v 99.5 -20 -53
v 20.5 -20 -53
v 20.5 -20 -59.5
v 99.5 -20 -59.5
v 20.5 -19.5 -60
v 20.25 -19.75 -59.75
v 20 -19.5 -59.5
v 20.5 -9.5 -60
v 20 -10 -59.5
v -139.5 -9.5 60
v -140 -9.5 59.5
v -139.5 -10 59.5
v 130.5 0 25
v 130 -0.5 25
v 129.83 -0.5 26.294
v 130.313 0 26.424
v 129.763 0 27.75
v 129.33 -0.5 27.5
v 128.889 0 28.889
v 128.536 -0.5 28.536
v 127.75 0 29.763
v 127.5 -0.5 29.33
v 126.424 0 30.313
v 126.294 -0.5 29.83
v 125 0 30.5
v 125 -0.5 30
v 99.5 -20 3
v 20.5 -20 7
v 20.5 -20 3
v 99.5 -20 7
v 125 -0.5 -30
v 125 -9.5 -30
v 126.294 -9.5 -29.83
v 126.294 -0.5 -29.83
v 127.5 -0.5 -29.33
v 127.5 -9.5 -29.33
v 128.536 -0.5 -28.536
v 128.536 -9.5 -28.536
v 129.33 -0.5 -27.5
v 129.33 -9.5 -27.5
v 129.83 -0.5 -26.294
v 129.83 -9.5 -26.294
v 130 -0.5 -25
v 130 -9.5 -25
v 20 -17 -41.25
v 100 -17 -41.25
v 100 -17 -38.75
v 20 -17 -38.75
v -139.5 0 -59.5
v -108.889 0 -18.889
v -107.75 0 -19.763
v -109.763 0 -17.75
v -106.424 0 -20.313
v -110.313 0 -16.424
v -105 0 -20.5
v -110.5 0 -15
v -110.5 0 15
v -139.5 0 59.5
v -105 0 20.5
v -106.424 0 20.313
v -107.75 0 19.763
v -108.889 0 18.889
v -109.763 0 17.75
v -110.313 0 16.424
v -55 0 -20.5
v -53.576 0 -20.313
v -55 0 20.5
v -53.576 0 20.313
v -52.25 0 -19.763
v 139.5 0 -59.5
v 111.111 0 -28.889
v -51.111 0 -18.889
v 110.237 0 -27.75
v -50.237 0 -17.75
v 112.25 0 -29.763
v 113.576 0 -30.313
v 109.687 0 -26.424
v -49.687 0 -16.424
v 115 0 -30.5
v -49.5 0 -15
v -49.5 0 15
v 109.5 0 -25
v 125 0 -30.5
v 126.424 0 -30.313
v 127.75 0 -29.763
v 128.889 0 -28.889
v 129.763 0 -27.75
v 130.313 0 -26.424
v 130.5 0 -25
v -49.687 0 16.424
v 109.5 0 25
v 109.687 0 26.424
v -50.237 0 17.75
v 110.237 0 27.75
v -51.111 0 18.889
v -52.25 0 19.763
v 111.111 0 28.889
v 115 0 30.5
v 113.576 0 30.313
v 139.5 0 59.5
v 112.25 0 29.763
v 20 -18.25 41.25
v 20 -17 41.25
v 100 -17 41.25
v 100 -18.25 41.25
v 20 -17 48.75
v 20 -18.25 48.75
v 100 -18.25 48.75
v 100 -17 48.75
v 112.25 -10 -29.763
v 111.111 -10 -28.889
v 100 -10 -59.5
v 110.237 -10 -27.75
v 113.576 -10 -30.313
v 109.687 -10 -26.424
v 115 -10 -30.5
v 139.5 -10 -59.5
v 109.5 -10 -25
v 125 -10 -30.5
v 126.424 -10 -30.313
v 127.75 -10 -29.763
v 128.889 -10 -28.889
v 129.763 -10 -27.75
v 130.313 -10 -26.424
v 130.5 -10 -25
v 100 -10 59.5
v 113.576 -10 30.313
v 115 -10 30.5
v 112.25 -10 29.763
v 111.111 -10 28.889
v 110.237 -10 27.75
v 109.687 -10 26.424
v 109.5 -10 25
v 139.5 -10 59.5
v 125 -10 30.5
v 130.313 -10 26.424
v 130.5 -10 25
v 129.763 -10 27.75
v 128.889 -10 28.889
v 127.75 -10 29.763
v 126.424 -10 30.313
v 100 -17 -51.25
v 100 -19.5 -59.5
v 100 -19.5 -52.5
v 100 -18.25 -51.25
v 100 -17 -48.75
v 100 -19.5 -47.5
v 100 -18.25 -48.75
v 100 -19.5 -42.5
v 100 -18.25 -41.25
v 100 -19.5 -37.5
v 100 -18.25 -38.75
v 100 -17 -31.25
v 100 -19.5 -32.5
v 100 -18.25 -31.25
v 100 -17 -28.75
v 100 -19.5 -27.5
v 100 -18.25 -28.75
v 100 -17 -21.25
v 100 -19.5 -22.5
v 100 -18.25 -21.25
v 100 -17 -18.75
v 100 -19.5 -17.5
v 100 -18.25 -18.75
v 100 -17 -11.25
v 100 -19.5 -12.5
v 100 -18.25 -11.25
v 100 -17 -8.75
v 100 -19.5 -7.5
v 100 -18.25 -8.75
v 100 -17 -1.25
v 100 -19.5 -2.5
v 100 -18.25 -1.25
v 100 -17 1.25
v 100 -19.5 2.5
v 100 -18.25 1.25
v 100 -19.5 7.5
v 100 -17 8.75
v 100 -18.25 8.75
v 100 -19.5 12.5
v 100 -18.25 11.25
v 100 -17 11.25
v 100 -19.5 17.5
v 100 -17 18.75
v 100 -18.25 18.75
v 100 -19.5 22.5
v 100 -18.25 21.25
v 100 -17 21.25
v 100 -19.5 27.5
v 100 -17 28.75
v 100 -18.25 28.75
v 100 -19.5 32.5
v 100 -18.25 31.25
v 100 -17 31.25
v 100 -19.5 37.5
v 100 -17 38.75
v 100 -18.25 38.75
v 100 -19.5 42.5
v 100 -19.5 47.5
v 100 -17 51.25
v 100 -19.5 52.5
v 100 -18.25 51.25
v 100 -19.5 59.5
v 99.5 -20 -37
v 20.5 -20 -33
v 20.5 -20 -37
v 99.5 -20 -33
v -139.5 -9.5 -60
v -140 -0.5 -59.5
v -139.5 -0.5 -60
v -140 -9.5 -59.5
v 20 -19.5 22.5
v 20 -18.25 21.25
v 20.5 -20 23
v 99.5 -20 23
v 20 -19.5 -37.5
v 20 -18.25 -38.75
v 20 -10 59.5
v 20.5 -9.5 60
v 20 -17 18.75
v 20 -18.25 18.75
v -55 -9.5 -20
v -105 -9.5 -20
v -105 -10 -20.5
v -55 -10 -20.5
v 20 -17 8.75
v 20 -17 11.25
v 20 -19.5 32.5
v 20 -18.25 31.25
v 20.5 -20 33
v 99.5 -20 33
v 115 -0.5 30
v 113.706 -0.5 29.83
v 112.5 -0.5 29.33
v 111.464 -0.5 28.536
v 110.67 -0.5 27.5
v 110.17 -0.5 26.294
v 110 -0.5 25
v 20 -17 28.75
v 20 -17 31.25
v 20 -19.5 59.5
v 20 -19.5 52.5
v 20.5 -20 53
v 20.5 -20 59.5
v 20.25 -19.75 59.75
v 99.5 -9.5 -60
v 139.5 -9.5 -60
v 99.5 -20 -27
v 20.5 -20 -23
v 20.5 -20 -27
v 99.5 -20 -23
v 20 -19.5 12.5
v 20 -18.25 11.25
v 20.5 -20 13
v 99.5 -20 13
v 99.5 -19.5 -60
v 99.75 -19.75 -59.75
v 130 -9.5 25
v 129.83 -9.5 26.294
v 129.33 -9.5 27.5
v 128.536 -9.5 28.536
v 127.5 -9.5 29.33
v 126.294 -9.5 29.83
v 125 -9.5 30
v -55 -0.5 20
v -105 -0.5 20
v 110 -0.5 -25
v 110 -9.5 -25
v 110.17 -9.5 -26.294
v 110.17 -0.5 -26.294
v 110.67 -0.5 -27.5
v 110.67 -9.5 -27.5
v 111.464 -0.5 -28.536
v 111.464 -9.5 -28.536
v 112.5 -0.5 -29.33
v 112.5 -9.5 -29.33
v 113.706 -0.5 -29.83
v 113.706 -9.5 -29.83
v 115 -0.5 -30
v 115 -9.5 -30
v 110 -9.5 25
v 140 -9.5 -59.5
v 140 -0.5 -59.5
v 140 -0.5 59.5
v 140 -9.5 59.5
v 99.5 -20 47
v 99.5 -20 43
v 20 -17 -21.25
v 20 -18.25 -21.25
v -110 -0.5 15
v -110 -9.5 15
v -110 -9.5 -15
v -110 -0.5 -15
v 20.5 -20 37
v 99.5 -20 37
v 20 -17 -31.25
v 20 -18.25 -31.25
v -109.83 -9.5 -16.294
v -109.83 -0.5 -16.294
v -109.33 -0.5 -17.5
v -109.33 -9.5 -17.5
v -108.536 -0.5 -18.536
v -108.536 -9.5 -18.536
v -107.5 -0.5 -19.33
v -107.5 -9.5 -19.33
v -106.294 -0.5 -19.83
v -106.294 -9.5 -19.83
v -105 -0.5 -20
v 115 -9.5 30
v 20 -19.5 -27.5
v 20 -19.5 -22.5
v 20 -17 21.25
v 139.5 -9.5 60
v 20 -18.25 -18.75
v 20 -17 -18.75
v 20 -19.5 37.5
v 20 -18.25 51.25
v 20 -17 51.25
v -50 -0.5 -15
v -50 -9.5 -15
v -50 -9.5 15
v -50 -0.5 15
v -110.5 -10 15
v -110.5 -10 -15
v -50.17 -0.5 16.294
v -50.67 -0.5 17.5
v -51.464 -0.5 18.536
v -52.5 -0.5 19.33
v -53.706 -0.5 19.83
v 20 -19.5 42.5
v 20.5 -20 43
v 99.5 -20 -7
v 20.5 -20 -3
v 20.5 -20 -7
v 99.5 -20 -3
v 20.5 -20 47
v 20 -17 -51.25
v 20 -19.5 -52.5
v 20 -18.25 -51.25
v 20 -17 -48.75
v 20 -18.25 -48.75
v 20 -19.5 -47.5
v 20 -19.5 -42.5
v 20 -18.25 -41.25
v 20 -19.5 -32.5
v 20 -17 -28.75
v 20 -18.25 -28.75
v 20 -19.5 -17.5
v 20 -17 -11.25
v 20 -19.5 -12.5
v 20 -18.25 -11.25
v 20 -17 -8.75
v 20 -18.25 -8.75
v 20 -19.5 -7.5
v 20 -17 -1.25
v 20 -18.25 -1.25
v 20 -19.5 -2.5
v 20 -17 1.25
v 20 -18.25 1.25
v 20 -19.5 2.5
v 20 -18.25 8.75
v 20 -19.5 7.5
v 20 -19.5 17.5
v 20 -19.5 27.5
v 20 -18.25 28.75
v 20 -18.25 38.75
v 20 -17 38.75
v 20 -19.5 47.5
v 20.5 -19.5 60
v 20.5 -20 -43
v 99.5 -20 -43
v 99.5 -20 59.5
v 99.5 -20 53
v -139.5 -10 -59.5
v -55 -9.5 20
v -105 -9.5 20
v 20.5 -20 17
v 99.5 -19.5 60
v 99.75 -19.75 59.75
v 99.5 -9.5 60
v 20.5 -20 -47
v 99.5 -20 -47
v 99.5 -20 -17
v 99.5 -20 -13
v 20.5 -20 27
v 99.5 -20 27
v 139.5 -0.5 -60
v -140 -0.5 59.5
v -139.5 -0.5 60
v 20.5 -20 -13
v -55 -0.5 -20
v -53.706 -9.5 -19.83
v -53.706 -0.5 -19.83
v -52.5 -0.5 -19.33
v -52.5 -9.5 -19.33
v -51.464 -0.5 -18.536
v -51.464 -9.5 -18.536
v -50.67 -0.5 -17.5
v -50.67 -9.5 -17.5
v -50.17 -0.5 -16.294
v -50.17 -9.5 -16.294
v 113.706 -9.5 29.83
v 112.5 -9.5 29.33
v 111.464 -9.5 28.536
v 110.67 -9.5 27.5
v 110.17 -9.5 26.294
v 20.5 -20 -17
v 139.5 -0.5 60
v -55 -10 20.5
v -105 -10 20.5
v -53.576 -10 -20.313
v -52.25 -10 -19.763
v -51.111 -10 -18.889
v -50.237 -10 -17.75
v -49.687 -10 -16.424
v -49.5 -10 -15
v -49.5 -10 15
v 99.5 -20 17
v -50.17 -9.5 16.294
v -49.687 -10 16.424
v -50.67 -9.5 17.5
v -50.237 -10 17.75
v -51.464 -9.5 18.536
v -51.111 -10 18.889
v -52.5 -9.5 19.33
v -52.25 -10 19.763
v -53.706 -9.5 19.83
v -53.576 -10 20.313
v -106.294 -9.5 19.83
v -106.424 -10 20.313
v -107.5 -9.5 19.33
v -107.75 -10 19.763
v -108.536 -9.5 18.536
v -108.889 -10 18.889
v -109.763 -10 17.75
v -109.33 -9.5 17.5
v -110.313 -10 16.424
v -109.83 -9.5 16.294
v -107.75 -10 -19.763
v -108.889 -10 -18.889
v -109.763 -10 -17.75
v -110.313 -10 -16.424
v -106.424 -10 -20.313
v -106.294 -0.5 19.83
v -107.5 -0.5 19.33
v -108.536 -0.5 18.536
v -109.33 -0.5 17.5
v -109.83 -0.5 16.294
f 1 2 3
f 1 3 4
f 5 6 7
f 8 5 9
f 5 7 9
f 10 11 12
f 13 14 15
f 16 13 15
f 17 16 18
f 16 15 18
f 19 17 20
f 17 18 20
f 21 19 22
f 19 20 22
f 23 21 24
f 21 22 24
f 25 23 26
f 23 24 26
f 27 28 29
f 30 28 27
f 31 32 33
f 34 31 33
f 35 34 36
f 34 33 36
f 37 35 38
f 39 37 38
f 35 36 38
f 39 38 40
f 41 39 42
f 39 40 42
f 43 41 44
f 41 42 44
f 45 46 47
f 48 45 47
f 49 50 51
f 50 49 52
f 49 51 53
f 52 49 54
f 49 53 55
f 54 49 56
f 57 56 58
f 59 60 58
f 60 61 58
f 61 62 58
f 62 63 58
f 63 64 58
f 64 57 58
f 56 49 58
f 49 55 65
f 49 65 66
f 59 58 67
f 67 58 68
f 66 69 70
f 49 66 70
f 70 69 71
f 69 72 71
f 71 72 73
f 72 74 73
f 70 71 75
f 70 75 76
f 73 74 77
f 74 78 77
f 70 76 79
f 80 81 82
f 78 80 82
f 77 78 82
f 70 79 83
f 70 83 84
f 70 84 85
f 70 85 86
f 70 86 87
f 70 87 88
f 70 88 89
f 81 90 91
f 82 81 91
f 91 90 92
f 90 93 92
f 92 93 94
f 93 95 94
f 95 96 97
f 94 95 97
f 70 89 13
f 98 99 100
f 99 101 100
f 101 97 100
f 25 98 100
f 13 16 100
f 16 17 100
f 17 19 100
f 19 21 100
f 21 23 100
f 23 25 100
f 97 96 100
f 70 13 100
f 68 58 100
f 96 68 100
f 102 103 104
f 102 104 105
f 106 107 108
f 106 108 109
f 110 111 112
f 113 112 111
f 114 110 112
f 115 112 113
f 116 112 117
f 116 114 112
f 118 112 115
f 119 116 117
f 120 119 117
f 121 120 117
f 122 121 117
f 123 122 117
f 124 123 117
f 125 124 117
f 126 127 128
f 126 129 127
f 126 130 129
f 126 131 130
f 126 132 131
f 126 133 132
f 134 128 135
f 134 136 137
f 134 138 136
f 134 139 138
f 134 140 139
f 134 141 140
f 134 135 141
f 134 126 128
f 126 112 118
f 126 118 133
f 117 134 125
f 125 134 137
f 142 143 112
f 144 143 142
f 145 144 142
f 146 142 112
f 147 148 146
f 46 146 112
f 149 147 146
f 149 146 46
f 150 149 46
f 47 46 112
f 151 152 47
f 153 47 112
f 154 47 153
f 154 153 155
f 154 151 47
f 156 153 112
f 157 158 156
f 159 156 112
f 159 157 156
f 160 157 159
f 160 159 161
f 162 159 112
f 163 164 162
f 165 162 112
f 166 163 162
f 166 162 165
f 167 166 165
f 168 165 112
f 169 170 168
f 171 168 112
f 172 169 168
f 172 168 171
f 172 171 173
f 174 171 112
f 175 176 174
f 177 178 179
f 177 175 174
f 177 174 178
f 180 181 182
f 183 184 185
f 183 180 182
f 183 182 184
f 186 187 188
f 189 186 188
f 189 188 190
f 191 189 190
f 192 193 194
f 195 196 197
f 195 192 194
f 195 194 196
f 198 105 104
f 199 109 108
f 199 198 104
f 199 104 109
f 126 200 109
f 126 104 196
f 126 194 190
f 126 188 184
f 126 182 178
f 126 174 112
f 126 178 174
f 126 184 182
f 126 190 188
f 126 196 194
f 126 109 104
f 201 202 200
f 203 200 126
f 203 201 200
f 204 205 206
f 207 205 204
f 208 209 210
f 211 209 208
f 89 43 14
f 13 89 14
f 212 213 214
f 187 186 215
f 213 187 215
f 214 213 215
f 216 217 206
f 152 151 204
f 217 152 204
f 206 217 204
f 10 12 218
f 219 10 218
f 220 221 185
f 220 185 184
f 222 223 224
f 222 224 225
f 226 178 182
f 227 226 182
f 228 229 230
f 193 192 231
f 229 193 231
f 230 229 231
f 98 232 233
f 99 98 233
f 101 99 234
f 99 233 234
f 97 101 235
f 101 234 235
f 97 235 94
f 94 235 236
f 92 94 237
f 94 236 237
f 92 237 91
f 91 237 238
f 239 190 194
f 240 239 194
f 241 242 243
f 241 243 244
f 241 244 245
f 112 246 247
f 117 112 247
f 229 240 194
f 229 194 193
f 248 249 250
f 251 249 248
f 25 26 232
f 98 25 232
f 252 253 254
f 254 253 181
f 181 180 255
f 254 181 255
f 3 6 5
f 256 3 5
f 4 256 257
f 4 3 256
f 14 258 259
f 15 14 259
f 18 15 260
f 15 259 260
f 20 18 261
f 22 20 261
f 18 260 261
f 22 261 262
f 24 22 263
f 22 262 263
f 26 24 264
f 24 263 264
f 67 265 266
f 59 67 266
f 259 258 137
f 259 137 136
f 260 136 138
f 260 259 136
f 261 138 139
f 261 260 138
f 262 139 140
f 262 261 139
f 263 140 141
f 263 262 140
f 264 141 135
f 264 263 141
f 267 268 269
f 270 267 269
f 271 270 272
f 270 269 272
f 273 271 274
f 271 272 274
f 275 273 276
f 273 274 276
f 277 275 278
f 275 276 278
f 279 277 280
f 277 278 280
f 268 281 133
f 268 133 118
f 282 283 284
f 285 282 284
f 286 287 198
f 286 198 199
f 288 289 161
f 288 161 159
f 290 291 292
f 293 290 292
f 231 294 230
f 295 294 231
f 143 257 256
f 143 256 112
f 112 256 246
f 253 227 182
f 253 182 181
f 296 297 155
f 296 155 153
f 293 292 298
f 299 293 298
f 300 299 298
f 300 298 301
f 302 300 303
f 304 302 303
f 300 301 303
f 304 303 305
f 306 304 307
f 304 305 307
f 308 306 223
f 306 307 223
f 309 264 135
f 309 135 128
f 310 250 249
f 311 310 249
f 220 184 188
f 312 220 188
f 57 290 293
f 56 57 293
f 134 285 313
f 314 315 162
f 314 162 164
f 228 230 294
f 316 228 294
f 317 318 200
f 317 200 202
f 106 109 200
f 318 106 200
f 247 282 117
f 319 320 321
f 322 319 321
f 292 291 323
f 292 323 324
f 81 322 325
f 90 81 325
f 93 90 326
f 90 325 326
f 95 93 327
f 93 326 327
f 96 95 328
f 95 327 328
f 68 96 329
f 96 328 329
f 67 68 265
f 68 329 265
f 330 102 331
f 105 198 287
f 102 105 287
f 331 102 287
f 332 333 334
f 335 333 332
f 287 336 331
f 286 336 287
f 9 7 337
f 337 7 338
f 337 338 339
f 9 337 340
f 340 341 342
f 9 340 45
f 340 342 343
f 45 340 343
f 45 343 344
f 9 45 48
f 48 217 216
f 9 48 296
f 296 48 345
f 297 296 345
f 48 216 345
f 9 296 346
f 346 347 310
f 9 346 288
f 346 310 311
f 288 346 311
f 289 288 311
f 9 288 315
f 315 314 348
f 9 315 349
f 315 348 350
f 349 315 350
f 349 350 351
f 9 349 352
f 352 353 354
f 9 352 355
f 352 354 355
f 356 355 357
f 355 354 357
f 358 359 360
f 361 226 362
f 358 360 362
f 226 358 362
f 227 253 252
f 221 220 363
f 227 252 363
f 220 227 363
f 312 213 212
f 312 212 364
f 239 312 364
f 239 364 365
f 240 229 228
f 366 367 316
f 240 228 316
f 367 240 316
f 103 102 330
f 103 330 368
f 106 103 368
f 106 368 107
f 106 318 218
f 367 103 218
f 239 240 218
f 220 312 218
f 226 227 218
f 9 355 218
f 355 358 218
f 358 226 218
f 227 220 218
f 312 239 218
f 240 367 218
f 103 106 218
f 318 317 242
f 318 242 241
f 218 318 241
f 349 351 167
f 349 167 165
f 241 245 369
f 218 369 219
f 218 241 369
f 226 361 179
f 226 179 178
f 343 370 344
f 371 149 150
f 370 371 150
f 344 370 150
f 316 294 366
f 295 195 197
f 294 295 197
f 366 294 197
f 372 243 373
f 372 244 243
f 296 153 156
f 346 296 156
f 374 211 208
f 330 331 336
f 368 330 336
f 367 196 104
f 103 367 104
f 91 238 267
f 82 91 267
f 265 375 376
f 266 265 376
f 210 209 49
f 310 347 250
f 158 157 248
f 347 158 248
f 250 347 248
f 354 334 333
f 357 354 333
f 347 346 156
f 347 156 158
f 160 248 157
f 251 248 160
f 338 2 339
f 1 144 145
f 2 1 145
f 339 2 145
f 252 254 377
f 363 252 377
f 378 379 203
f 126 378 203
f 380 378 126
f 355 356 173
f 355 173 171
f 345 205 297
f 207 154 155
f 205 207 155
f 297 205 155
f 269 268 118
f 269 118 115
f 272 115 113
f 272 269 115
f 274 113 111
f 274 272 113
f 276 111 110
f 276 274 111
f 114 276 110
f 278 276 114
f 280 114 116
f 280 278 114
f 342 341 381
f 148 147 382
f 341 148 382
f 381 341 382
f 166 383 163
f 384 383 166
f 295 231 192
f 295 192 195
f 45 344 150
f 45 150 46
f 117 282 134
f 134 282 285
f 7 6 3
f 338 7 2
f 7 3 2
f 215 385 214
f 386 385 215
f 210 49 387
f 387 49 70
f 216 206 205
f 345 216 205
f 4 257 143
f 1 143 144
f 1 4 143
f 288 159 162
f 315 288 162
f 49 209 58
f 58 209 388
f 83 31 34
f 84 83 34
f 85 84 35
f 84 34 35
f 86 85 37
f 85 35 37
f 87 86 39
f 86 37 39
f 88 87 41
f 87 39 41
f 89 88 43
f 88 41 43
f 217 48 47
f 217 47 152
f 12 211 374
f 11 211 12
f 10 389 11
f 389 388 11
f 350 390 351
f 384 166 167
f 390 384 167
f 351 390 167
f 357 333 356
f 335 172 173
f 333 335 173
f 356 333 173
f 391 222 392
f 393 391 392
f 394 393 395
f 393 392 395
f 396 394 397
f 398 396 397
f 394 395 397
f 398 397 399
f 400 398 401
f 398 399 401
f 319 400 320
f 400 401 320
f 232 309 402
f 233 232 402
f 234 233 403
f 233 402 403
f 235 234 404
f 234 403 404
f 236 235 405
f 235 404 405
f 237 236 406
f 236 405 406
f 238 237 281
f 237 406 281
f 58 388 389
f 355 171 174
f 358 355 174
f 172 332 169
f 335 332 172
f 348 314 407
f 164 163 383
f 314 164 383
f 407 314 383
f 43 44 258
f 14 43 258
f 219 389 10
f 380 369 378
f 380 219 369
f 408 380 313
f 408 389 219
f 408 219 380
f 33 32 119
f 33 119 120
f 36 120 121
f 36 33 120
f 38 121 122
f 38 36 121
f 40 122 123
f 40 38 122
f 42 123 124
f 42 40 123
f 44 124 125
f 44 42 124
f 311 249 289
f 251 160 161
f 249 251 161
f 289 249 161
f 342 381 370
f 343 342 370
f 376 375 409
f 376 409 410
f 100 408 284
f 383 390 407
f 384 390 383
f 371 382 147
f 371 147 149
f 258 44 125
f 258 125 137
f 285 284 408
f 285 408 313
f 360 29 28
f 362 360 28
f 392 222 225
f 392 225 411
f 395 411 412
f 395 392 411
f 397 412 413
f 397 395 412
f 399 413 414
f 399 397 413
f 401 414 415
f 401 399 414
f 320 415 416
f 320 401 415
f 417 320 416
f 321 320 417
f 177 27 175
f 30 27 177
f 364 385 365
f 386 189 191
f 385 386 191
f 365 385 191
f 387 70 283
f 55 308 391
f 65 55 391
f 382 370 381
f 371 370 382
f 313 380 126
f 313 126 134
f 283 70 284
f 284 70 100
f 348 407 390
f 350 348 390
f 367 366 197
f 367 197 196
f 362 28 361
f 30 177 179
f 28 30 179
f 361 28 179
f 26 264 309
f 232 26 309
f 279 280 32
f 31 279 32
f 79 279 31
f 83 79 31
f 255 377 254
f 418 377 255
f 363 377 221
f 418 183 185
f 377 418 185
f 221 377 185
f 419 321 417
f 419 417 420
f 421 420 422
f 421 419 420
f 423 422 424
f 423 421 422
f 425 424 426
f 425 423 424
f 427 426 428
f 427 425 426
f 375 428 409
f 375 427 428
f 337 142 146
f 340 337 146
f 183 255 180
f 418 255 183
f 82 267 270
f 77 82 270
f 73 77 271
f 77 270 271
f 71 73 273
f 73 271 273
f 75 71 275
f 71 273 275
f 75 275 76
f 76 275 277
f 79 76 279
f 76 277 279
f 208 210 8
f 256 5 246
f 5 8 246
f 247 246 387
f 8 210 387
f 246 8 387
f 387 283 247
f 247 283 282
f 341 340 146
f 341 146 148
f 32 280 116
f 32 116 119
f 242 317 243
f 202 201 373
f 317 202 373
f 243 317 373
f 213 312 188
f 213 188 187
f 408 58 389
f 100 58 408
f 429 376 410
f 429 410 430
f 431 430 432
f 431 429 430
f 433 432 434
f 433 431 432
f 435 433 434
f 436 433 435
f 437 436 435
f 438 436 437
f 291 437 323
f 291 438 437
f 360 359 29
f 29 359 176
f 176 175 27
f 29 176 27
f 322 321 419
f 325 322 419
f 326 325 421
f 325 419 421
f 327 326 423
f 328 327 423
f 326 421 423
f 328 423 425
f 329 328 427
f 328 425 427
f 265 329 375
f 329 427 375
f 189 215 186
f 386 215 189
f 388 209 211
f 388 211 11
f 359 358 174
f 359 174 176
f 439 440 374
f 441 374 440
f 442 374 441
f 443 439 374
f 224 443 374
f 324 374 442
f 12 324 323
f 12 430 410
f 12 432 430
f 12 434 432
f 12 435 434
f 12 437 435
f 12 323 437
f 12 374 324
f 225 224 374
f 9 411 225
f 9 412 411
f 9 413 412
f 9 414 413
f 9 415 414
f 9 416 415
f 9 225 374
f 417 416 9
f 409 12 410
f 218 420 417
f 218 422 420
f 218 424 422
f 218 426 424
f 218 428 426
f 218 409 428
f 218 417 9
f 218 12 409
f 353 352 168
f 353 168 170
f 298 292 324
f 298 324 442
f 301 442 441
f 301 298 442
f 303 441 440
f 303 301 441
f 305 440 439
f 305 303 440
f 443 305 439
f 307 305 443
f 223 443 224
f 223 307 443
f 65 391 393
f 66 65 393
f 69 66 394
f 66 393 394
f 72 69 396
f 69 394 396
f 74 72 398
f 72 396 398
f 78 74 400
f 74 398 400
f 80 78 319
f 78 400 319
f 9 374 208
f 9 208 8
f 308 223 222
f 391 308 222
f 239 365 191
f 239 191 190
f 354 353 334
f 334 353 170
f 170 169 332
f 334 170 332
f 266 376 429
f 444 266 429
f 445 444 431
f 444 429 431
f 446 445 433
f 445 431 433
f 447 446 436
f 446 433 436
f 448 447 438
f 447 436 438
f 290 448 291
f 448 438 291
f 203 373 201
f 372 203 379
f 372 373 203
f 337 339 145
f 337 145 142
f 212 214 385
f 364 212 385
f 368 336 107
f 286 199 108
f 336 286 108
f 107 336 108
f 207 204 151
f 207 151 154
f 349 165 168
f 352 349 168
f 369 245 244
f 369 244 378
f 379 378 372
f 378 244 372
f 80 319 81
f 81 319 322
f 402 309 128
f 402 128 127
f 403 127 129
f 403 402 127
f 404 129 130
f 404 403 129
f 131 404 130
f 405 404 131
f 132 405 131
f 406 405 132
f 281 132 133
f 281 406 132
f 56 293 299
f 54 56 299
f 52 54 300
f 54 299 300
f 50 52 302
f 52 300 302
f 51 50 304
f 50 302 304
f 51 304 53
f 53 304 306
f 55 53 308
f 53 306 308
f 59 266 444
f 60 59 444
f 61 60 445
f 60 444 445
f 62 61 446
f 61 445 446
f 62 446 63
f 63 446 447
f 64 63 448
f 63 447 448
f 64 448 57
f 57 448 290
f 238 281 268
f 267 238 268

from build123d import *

# Parameters (mm, degrees)
F0_W      = 280
F0_H      = 120
F1_DEPTH  = 20
F2_W      = 160
F2_H      = 120
F3_DEPTH  = 10
F5_DEPTH  = 25
F6_W      = 40
F6_H      = 120
F7_DEPTH  = 10
F9_DEPTH  = 10.001
F11_DEPTH = 240.001
F12_SIZE  = 0.5
F13_SIZE  = 0.5
F14_SIZE  = 0.5


with BuildPart() as f1:
    # F0 (on Front) → F1 (new body)
    with BuildSketch(Plane.XZ):
        Rectangle(F0_W, F0_H)
    extrude(amount=F1_DEPTH)

    # F2 (on face) → F3 (cut)
    with BuildSketch(Plane.XZ.offset(20)):
        with Locations((-60, 0)):
            Rectangle(F2_W, F2_H)
    extrude(amount=-F3_DEPTH, mode=Mode.SUBTRACT)

    # F4 (on face) → F5 (cut)
    with BuildSketch(Plane.XZ.offset(10)):
        with BuildLine():
            Line((-105, -20), (-55, -20))
            ThreePointArc((-55, -20), (-51.4644660941, -18.5355339059), (-50, -15))
            Line((-50, -15), (-50, 15))
            ThreePointArc((-50, 15), (-51.4644660941, 18.5355339059), (-55, 20))
            Line((-55, 20), (-105, 20))
            ThreePointArc((-105, 20), (-108.5355339059, 18.5355339059), (-110, 15))
            Line((-110, 15), (-110, -15))
            ThreePointArc((-110, -15), (-108.5355339059, -18.5355339059), (-105, -20))
        make_face()
    extrude(amount=-F5_DEPTH, mode=Mode.SUBTRACT)

    # F6 (on face) → F7 (cut)
    with BuildSketch(Plane.XZ.offset(20)):
        with Locations((120, 0)):
            Rectangle(F6_W, F6_H)
    extrude(amount=-F7_DEPTH, mode=Mode.SUBTRACT)

    # F8 (on face) → F9 (cut, through all)
    with BuildSketch(Plane.XZ.offset(10)):
        with BuildLine():
            ThreePointArc((110, -25), (111.4644660941, -28.5355339059), (115, -30))
            Line((115, -30), (125, -30))
            ThreePointArc((125, -30), (128.5355339059, -28.5355339059), (130, -25))
            Line((130, -25), (130, 25))
            ThreePointArc((130, 25), (128.5355339059, 28.5355339059), (125, 30))
            Line((125, 30), (115, 30))
            ThreePointArc((115, 30), (111.4644660941, 28.5355339059), (110, 25))
            Line((110, 25), (110, -25))
        make_face()
    extrude(amount=-F9_DEPTH, mode=Mode.SUBTRACT)

    # F10 (on face) → F11 (cut, through all)
    with BuildSketch(Plane.YZ.offset(100)):
        Polygon((-18.25, -51.25), (-17, -51.25), (-17, -48.75), (-18.25, -48.75), (-20, -47), (-20, -53), align=None)
        Polygon((-20, -37), (-20, -43), (-18.25, -41.25), (-17, -41.25), (-17, -38.75), (-18.25, -38.75), align=None)
        Polygon((-20, -27), (-20, -33), (-18.25, -31.25), (-17, -31.25), (-17, -28.75), (-18.25, -28.75), align=None)
        Polygon((-20, -17), (-20, -23), (-18.25, -21.25), (-17, -21.25), (-17, -18.75), (-18.25, -18.75), align=None)
        Polygon((-20, -7), (-20, -13), (-18.25, -11.25), (-17, -11.25), (-17, -8.75), (-18.25, -8.75), align=None)
        Polygon((-20, 3), (-20, -3), (-18.25, -1.25), (-17, -1.25), (-17, 1.25), (-18.25, 1.25), align=None)
        Polygon((-20, 13), (-20, 7), (-18.25, 8.75), (-17, 8.75), (-17, 11.25), (-18.25, 11.25), align=None)
        Polygon((-20, 23), (-20, 17), (-18.25, 18.75), (-17, 18.75), (-17, 21.25), (-18.25, 21.25), align=None)
        Polygon((-20, 33), (-20, 27), (-18.25, 28.75), (-17, 28.75), (-17, 31.25), (-18.25, 31.25), align=None)
        Polygon((-20, 43), (-20, 37), (-18.25, 38.75), (-17, 38.75), (-17, 41.25), (-18.25, 41.25), align=None)
        Polygon((-20, 53), (-20, 47), (-18.25, 48.75), (-17, 48.75), (-17, 51.25), (-18.25, 51.25), align=None)
    extrude(amount=-F11_DEPTH, mode=Mode.SUBTRACT)

    # F12
    f12_edges = [f1.edges().sort_by_distance(p)[0] for p in [
        (60, -20, -60),
        (100, -20, -56.5),
        (100, -20, -45),
        (100, -20, -25),
        (100, -20, -15),
        (100, -20, -35),
        (100, -20, -5),
        (100, -20, 5),
        (100, -20, 15),
        (100, -20, 25),
        (100, -20, 35),
        (100, -20, 45),
        (100, -20, 56.5),
        (60, -20, 60),
        (20, -20, -56.5),
        (20, -20, -45),
        (20, -20, -35),
        (20, -20, -25),
        (20, -20, -15),
        (20, -20, -5),
        (20, -20, 5),
        (20, -20, 15),
        (20, -20, 25),
        (20, -20, 56.5),
        (20, -20, 45),
        (20, -20, 35),
    ]]
    chamfer(f12_edges, length=F12_SIZE)

    # F13
    f13_edges = [f1.edges().sort_by_distance(p)[0] for p in [
        (110, -10, 0),
        (-80, -10, -20),
        (-80, 0, -20),
        (110, 0, 0),
    ]]
    chamfer(f13_edges, length=F13_SIZE)

    # F14
    f14_edges = [f1.edges().sort_by_distance(p)[0] for p in [
        (-140, -5, 60),
        (-140, -10, 0),
        (-140, 0, 0),
        (-140, -5, -60),
        (-60, -10, 60),
        (0, 0, 60),
        (20, -14.75, 60),
        (20, -14.75, -60),
        (-60, -10, -60),
        (0, 0, -60),
        (140, -5, 60),
        (140, 0, 0),
        (140, -10, 0),
        (140, -5, -60),
        (100, -14.75, 60),
        (120, -10, 60),
        (120, -10, -60),
        (100, -14.75, -60),
    ]]
    chamfer(f14_edges, length=F14_SIZE)


solid = f1.part
